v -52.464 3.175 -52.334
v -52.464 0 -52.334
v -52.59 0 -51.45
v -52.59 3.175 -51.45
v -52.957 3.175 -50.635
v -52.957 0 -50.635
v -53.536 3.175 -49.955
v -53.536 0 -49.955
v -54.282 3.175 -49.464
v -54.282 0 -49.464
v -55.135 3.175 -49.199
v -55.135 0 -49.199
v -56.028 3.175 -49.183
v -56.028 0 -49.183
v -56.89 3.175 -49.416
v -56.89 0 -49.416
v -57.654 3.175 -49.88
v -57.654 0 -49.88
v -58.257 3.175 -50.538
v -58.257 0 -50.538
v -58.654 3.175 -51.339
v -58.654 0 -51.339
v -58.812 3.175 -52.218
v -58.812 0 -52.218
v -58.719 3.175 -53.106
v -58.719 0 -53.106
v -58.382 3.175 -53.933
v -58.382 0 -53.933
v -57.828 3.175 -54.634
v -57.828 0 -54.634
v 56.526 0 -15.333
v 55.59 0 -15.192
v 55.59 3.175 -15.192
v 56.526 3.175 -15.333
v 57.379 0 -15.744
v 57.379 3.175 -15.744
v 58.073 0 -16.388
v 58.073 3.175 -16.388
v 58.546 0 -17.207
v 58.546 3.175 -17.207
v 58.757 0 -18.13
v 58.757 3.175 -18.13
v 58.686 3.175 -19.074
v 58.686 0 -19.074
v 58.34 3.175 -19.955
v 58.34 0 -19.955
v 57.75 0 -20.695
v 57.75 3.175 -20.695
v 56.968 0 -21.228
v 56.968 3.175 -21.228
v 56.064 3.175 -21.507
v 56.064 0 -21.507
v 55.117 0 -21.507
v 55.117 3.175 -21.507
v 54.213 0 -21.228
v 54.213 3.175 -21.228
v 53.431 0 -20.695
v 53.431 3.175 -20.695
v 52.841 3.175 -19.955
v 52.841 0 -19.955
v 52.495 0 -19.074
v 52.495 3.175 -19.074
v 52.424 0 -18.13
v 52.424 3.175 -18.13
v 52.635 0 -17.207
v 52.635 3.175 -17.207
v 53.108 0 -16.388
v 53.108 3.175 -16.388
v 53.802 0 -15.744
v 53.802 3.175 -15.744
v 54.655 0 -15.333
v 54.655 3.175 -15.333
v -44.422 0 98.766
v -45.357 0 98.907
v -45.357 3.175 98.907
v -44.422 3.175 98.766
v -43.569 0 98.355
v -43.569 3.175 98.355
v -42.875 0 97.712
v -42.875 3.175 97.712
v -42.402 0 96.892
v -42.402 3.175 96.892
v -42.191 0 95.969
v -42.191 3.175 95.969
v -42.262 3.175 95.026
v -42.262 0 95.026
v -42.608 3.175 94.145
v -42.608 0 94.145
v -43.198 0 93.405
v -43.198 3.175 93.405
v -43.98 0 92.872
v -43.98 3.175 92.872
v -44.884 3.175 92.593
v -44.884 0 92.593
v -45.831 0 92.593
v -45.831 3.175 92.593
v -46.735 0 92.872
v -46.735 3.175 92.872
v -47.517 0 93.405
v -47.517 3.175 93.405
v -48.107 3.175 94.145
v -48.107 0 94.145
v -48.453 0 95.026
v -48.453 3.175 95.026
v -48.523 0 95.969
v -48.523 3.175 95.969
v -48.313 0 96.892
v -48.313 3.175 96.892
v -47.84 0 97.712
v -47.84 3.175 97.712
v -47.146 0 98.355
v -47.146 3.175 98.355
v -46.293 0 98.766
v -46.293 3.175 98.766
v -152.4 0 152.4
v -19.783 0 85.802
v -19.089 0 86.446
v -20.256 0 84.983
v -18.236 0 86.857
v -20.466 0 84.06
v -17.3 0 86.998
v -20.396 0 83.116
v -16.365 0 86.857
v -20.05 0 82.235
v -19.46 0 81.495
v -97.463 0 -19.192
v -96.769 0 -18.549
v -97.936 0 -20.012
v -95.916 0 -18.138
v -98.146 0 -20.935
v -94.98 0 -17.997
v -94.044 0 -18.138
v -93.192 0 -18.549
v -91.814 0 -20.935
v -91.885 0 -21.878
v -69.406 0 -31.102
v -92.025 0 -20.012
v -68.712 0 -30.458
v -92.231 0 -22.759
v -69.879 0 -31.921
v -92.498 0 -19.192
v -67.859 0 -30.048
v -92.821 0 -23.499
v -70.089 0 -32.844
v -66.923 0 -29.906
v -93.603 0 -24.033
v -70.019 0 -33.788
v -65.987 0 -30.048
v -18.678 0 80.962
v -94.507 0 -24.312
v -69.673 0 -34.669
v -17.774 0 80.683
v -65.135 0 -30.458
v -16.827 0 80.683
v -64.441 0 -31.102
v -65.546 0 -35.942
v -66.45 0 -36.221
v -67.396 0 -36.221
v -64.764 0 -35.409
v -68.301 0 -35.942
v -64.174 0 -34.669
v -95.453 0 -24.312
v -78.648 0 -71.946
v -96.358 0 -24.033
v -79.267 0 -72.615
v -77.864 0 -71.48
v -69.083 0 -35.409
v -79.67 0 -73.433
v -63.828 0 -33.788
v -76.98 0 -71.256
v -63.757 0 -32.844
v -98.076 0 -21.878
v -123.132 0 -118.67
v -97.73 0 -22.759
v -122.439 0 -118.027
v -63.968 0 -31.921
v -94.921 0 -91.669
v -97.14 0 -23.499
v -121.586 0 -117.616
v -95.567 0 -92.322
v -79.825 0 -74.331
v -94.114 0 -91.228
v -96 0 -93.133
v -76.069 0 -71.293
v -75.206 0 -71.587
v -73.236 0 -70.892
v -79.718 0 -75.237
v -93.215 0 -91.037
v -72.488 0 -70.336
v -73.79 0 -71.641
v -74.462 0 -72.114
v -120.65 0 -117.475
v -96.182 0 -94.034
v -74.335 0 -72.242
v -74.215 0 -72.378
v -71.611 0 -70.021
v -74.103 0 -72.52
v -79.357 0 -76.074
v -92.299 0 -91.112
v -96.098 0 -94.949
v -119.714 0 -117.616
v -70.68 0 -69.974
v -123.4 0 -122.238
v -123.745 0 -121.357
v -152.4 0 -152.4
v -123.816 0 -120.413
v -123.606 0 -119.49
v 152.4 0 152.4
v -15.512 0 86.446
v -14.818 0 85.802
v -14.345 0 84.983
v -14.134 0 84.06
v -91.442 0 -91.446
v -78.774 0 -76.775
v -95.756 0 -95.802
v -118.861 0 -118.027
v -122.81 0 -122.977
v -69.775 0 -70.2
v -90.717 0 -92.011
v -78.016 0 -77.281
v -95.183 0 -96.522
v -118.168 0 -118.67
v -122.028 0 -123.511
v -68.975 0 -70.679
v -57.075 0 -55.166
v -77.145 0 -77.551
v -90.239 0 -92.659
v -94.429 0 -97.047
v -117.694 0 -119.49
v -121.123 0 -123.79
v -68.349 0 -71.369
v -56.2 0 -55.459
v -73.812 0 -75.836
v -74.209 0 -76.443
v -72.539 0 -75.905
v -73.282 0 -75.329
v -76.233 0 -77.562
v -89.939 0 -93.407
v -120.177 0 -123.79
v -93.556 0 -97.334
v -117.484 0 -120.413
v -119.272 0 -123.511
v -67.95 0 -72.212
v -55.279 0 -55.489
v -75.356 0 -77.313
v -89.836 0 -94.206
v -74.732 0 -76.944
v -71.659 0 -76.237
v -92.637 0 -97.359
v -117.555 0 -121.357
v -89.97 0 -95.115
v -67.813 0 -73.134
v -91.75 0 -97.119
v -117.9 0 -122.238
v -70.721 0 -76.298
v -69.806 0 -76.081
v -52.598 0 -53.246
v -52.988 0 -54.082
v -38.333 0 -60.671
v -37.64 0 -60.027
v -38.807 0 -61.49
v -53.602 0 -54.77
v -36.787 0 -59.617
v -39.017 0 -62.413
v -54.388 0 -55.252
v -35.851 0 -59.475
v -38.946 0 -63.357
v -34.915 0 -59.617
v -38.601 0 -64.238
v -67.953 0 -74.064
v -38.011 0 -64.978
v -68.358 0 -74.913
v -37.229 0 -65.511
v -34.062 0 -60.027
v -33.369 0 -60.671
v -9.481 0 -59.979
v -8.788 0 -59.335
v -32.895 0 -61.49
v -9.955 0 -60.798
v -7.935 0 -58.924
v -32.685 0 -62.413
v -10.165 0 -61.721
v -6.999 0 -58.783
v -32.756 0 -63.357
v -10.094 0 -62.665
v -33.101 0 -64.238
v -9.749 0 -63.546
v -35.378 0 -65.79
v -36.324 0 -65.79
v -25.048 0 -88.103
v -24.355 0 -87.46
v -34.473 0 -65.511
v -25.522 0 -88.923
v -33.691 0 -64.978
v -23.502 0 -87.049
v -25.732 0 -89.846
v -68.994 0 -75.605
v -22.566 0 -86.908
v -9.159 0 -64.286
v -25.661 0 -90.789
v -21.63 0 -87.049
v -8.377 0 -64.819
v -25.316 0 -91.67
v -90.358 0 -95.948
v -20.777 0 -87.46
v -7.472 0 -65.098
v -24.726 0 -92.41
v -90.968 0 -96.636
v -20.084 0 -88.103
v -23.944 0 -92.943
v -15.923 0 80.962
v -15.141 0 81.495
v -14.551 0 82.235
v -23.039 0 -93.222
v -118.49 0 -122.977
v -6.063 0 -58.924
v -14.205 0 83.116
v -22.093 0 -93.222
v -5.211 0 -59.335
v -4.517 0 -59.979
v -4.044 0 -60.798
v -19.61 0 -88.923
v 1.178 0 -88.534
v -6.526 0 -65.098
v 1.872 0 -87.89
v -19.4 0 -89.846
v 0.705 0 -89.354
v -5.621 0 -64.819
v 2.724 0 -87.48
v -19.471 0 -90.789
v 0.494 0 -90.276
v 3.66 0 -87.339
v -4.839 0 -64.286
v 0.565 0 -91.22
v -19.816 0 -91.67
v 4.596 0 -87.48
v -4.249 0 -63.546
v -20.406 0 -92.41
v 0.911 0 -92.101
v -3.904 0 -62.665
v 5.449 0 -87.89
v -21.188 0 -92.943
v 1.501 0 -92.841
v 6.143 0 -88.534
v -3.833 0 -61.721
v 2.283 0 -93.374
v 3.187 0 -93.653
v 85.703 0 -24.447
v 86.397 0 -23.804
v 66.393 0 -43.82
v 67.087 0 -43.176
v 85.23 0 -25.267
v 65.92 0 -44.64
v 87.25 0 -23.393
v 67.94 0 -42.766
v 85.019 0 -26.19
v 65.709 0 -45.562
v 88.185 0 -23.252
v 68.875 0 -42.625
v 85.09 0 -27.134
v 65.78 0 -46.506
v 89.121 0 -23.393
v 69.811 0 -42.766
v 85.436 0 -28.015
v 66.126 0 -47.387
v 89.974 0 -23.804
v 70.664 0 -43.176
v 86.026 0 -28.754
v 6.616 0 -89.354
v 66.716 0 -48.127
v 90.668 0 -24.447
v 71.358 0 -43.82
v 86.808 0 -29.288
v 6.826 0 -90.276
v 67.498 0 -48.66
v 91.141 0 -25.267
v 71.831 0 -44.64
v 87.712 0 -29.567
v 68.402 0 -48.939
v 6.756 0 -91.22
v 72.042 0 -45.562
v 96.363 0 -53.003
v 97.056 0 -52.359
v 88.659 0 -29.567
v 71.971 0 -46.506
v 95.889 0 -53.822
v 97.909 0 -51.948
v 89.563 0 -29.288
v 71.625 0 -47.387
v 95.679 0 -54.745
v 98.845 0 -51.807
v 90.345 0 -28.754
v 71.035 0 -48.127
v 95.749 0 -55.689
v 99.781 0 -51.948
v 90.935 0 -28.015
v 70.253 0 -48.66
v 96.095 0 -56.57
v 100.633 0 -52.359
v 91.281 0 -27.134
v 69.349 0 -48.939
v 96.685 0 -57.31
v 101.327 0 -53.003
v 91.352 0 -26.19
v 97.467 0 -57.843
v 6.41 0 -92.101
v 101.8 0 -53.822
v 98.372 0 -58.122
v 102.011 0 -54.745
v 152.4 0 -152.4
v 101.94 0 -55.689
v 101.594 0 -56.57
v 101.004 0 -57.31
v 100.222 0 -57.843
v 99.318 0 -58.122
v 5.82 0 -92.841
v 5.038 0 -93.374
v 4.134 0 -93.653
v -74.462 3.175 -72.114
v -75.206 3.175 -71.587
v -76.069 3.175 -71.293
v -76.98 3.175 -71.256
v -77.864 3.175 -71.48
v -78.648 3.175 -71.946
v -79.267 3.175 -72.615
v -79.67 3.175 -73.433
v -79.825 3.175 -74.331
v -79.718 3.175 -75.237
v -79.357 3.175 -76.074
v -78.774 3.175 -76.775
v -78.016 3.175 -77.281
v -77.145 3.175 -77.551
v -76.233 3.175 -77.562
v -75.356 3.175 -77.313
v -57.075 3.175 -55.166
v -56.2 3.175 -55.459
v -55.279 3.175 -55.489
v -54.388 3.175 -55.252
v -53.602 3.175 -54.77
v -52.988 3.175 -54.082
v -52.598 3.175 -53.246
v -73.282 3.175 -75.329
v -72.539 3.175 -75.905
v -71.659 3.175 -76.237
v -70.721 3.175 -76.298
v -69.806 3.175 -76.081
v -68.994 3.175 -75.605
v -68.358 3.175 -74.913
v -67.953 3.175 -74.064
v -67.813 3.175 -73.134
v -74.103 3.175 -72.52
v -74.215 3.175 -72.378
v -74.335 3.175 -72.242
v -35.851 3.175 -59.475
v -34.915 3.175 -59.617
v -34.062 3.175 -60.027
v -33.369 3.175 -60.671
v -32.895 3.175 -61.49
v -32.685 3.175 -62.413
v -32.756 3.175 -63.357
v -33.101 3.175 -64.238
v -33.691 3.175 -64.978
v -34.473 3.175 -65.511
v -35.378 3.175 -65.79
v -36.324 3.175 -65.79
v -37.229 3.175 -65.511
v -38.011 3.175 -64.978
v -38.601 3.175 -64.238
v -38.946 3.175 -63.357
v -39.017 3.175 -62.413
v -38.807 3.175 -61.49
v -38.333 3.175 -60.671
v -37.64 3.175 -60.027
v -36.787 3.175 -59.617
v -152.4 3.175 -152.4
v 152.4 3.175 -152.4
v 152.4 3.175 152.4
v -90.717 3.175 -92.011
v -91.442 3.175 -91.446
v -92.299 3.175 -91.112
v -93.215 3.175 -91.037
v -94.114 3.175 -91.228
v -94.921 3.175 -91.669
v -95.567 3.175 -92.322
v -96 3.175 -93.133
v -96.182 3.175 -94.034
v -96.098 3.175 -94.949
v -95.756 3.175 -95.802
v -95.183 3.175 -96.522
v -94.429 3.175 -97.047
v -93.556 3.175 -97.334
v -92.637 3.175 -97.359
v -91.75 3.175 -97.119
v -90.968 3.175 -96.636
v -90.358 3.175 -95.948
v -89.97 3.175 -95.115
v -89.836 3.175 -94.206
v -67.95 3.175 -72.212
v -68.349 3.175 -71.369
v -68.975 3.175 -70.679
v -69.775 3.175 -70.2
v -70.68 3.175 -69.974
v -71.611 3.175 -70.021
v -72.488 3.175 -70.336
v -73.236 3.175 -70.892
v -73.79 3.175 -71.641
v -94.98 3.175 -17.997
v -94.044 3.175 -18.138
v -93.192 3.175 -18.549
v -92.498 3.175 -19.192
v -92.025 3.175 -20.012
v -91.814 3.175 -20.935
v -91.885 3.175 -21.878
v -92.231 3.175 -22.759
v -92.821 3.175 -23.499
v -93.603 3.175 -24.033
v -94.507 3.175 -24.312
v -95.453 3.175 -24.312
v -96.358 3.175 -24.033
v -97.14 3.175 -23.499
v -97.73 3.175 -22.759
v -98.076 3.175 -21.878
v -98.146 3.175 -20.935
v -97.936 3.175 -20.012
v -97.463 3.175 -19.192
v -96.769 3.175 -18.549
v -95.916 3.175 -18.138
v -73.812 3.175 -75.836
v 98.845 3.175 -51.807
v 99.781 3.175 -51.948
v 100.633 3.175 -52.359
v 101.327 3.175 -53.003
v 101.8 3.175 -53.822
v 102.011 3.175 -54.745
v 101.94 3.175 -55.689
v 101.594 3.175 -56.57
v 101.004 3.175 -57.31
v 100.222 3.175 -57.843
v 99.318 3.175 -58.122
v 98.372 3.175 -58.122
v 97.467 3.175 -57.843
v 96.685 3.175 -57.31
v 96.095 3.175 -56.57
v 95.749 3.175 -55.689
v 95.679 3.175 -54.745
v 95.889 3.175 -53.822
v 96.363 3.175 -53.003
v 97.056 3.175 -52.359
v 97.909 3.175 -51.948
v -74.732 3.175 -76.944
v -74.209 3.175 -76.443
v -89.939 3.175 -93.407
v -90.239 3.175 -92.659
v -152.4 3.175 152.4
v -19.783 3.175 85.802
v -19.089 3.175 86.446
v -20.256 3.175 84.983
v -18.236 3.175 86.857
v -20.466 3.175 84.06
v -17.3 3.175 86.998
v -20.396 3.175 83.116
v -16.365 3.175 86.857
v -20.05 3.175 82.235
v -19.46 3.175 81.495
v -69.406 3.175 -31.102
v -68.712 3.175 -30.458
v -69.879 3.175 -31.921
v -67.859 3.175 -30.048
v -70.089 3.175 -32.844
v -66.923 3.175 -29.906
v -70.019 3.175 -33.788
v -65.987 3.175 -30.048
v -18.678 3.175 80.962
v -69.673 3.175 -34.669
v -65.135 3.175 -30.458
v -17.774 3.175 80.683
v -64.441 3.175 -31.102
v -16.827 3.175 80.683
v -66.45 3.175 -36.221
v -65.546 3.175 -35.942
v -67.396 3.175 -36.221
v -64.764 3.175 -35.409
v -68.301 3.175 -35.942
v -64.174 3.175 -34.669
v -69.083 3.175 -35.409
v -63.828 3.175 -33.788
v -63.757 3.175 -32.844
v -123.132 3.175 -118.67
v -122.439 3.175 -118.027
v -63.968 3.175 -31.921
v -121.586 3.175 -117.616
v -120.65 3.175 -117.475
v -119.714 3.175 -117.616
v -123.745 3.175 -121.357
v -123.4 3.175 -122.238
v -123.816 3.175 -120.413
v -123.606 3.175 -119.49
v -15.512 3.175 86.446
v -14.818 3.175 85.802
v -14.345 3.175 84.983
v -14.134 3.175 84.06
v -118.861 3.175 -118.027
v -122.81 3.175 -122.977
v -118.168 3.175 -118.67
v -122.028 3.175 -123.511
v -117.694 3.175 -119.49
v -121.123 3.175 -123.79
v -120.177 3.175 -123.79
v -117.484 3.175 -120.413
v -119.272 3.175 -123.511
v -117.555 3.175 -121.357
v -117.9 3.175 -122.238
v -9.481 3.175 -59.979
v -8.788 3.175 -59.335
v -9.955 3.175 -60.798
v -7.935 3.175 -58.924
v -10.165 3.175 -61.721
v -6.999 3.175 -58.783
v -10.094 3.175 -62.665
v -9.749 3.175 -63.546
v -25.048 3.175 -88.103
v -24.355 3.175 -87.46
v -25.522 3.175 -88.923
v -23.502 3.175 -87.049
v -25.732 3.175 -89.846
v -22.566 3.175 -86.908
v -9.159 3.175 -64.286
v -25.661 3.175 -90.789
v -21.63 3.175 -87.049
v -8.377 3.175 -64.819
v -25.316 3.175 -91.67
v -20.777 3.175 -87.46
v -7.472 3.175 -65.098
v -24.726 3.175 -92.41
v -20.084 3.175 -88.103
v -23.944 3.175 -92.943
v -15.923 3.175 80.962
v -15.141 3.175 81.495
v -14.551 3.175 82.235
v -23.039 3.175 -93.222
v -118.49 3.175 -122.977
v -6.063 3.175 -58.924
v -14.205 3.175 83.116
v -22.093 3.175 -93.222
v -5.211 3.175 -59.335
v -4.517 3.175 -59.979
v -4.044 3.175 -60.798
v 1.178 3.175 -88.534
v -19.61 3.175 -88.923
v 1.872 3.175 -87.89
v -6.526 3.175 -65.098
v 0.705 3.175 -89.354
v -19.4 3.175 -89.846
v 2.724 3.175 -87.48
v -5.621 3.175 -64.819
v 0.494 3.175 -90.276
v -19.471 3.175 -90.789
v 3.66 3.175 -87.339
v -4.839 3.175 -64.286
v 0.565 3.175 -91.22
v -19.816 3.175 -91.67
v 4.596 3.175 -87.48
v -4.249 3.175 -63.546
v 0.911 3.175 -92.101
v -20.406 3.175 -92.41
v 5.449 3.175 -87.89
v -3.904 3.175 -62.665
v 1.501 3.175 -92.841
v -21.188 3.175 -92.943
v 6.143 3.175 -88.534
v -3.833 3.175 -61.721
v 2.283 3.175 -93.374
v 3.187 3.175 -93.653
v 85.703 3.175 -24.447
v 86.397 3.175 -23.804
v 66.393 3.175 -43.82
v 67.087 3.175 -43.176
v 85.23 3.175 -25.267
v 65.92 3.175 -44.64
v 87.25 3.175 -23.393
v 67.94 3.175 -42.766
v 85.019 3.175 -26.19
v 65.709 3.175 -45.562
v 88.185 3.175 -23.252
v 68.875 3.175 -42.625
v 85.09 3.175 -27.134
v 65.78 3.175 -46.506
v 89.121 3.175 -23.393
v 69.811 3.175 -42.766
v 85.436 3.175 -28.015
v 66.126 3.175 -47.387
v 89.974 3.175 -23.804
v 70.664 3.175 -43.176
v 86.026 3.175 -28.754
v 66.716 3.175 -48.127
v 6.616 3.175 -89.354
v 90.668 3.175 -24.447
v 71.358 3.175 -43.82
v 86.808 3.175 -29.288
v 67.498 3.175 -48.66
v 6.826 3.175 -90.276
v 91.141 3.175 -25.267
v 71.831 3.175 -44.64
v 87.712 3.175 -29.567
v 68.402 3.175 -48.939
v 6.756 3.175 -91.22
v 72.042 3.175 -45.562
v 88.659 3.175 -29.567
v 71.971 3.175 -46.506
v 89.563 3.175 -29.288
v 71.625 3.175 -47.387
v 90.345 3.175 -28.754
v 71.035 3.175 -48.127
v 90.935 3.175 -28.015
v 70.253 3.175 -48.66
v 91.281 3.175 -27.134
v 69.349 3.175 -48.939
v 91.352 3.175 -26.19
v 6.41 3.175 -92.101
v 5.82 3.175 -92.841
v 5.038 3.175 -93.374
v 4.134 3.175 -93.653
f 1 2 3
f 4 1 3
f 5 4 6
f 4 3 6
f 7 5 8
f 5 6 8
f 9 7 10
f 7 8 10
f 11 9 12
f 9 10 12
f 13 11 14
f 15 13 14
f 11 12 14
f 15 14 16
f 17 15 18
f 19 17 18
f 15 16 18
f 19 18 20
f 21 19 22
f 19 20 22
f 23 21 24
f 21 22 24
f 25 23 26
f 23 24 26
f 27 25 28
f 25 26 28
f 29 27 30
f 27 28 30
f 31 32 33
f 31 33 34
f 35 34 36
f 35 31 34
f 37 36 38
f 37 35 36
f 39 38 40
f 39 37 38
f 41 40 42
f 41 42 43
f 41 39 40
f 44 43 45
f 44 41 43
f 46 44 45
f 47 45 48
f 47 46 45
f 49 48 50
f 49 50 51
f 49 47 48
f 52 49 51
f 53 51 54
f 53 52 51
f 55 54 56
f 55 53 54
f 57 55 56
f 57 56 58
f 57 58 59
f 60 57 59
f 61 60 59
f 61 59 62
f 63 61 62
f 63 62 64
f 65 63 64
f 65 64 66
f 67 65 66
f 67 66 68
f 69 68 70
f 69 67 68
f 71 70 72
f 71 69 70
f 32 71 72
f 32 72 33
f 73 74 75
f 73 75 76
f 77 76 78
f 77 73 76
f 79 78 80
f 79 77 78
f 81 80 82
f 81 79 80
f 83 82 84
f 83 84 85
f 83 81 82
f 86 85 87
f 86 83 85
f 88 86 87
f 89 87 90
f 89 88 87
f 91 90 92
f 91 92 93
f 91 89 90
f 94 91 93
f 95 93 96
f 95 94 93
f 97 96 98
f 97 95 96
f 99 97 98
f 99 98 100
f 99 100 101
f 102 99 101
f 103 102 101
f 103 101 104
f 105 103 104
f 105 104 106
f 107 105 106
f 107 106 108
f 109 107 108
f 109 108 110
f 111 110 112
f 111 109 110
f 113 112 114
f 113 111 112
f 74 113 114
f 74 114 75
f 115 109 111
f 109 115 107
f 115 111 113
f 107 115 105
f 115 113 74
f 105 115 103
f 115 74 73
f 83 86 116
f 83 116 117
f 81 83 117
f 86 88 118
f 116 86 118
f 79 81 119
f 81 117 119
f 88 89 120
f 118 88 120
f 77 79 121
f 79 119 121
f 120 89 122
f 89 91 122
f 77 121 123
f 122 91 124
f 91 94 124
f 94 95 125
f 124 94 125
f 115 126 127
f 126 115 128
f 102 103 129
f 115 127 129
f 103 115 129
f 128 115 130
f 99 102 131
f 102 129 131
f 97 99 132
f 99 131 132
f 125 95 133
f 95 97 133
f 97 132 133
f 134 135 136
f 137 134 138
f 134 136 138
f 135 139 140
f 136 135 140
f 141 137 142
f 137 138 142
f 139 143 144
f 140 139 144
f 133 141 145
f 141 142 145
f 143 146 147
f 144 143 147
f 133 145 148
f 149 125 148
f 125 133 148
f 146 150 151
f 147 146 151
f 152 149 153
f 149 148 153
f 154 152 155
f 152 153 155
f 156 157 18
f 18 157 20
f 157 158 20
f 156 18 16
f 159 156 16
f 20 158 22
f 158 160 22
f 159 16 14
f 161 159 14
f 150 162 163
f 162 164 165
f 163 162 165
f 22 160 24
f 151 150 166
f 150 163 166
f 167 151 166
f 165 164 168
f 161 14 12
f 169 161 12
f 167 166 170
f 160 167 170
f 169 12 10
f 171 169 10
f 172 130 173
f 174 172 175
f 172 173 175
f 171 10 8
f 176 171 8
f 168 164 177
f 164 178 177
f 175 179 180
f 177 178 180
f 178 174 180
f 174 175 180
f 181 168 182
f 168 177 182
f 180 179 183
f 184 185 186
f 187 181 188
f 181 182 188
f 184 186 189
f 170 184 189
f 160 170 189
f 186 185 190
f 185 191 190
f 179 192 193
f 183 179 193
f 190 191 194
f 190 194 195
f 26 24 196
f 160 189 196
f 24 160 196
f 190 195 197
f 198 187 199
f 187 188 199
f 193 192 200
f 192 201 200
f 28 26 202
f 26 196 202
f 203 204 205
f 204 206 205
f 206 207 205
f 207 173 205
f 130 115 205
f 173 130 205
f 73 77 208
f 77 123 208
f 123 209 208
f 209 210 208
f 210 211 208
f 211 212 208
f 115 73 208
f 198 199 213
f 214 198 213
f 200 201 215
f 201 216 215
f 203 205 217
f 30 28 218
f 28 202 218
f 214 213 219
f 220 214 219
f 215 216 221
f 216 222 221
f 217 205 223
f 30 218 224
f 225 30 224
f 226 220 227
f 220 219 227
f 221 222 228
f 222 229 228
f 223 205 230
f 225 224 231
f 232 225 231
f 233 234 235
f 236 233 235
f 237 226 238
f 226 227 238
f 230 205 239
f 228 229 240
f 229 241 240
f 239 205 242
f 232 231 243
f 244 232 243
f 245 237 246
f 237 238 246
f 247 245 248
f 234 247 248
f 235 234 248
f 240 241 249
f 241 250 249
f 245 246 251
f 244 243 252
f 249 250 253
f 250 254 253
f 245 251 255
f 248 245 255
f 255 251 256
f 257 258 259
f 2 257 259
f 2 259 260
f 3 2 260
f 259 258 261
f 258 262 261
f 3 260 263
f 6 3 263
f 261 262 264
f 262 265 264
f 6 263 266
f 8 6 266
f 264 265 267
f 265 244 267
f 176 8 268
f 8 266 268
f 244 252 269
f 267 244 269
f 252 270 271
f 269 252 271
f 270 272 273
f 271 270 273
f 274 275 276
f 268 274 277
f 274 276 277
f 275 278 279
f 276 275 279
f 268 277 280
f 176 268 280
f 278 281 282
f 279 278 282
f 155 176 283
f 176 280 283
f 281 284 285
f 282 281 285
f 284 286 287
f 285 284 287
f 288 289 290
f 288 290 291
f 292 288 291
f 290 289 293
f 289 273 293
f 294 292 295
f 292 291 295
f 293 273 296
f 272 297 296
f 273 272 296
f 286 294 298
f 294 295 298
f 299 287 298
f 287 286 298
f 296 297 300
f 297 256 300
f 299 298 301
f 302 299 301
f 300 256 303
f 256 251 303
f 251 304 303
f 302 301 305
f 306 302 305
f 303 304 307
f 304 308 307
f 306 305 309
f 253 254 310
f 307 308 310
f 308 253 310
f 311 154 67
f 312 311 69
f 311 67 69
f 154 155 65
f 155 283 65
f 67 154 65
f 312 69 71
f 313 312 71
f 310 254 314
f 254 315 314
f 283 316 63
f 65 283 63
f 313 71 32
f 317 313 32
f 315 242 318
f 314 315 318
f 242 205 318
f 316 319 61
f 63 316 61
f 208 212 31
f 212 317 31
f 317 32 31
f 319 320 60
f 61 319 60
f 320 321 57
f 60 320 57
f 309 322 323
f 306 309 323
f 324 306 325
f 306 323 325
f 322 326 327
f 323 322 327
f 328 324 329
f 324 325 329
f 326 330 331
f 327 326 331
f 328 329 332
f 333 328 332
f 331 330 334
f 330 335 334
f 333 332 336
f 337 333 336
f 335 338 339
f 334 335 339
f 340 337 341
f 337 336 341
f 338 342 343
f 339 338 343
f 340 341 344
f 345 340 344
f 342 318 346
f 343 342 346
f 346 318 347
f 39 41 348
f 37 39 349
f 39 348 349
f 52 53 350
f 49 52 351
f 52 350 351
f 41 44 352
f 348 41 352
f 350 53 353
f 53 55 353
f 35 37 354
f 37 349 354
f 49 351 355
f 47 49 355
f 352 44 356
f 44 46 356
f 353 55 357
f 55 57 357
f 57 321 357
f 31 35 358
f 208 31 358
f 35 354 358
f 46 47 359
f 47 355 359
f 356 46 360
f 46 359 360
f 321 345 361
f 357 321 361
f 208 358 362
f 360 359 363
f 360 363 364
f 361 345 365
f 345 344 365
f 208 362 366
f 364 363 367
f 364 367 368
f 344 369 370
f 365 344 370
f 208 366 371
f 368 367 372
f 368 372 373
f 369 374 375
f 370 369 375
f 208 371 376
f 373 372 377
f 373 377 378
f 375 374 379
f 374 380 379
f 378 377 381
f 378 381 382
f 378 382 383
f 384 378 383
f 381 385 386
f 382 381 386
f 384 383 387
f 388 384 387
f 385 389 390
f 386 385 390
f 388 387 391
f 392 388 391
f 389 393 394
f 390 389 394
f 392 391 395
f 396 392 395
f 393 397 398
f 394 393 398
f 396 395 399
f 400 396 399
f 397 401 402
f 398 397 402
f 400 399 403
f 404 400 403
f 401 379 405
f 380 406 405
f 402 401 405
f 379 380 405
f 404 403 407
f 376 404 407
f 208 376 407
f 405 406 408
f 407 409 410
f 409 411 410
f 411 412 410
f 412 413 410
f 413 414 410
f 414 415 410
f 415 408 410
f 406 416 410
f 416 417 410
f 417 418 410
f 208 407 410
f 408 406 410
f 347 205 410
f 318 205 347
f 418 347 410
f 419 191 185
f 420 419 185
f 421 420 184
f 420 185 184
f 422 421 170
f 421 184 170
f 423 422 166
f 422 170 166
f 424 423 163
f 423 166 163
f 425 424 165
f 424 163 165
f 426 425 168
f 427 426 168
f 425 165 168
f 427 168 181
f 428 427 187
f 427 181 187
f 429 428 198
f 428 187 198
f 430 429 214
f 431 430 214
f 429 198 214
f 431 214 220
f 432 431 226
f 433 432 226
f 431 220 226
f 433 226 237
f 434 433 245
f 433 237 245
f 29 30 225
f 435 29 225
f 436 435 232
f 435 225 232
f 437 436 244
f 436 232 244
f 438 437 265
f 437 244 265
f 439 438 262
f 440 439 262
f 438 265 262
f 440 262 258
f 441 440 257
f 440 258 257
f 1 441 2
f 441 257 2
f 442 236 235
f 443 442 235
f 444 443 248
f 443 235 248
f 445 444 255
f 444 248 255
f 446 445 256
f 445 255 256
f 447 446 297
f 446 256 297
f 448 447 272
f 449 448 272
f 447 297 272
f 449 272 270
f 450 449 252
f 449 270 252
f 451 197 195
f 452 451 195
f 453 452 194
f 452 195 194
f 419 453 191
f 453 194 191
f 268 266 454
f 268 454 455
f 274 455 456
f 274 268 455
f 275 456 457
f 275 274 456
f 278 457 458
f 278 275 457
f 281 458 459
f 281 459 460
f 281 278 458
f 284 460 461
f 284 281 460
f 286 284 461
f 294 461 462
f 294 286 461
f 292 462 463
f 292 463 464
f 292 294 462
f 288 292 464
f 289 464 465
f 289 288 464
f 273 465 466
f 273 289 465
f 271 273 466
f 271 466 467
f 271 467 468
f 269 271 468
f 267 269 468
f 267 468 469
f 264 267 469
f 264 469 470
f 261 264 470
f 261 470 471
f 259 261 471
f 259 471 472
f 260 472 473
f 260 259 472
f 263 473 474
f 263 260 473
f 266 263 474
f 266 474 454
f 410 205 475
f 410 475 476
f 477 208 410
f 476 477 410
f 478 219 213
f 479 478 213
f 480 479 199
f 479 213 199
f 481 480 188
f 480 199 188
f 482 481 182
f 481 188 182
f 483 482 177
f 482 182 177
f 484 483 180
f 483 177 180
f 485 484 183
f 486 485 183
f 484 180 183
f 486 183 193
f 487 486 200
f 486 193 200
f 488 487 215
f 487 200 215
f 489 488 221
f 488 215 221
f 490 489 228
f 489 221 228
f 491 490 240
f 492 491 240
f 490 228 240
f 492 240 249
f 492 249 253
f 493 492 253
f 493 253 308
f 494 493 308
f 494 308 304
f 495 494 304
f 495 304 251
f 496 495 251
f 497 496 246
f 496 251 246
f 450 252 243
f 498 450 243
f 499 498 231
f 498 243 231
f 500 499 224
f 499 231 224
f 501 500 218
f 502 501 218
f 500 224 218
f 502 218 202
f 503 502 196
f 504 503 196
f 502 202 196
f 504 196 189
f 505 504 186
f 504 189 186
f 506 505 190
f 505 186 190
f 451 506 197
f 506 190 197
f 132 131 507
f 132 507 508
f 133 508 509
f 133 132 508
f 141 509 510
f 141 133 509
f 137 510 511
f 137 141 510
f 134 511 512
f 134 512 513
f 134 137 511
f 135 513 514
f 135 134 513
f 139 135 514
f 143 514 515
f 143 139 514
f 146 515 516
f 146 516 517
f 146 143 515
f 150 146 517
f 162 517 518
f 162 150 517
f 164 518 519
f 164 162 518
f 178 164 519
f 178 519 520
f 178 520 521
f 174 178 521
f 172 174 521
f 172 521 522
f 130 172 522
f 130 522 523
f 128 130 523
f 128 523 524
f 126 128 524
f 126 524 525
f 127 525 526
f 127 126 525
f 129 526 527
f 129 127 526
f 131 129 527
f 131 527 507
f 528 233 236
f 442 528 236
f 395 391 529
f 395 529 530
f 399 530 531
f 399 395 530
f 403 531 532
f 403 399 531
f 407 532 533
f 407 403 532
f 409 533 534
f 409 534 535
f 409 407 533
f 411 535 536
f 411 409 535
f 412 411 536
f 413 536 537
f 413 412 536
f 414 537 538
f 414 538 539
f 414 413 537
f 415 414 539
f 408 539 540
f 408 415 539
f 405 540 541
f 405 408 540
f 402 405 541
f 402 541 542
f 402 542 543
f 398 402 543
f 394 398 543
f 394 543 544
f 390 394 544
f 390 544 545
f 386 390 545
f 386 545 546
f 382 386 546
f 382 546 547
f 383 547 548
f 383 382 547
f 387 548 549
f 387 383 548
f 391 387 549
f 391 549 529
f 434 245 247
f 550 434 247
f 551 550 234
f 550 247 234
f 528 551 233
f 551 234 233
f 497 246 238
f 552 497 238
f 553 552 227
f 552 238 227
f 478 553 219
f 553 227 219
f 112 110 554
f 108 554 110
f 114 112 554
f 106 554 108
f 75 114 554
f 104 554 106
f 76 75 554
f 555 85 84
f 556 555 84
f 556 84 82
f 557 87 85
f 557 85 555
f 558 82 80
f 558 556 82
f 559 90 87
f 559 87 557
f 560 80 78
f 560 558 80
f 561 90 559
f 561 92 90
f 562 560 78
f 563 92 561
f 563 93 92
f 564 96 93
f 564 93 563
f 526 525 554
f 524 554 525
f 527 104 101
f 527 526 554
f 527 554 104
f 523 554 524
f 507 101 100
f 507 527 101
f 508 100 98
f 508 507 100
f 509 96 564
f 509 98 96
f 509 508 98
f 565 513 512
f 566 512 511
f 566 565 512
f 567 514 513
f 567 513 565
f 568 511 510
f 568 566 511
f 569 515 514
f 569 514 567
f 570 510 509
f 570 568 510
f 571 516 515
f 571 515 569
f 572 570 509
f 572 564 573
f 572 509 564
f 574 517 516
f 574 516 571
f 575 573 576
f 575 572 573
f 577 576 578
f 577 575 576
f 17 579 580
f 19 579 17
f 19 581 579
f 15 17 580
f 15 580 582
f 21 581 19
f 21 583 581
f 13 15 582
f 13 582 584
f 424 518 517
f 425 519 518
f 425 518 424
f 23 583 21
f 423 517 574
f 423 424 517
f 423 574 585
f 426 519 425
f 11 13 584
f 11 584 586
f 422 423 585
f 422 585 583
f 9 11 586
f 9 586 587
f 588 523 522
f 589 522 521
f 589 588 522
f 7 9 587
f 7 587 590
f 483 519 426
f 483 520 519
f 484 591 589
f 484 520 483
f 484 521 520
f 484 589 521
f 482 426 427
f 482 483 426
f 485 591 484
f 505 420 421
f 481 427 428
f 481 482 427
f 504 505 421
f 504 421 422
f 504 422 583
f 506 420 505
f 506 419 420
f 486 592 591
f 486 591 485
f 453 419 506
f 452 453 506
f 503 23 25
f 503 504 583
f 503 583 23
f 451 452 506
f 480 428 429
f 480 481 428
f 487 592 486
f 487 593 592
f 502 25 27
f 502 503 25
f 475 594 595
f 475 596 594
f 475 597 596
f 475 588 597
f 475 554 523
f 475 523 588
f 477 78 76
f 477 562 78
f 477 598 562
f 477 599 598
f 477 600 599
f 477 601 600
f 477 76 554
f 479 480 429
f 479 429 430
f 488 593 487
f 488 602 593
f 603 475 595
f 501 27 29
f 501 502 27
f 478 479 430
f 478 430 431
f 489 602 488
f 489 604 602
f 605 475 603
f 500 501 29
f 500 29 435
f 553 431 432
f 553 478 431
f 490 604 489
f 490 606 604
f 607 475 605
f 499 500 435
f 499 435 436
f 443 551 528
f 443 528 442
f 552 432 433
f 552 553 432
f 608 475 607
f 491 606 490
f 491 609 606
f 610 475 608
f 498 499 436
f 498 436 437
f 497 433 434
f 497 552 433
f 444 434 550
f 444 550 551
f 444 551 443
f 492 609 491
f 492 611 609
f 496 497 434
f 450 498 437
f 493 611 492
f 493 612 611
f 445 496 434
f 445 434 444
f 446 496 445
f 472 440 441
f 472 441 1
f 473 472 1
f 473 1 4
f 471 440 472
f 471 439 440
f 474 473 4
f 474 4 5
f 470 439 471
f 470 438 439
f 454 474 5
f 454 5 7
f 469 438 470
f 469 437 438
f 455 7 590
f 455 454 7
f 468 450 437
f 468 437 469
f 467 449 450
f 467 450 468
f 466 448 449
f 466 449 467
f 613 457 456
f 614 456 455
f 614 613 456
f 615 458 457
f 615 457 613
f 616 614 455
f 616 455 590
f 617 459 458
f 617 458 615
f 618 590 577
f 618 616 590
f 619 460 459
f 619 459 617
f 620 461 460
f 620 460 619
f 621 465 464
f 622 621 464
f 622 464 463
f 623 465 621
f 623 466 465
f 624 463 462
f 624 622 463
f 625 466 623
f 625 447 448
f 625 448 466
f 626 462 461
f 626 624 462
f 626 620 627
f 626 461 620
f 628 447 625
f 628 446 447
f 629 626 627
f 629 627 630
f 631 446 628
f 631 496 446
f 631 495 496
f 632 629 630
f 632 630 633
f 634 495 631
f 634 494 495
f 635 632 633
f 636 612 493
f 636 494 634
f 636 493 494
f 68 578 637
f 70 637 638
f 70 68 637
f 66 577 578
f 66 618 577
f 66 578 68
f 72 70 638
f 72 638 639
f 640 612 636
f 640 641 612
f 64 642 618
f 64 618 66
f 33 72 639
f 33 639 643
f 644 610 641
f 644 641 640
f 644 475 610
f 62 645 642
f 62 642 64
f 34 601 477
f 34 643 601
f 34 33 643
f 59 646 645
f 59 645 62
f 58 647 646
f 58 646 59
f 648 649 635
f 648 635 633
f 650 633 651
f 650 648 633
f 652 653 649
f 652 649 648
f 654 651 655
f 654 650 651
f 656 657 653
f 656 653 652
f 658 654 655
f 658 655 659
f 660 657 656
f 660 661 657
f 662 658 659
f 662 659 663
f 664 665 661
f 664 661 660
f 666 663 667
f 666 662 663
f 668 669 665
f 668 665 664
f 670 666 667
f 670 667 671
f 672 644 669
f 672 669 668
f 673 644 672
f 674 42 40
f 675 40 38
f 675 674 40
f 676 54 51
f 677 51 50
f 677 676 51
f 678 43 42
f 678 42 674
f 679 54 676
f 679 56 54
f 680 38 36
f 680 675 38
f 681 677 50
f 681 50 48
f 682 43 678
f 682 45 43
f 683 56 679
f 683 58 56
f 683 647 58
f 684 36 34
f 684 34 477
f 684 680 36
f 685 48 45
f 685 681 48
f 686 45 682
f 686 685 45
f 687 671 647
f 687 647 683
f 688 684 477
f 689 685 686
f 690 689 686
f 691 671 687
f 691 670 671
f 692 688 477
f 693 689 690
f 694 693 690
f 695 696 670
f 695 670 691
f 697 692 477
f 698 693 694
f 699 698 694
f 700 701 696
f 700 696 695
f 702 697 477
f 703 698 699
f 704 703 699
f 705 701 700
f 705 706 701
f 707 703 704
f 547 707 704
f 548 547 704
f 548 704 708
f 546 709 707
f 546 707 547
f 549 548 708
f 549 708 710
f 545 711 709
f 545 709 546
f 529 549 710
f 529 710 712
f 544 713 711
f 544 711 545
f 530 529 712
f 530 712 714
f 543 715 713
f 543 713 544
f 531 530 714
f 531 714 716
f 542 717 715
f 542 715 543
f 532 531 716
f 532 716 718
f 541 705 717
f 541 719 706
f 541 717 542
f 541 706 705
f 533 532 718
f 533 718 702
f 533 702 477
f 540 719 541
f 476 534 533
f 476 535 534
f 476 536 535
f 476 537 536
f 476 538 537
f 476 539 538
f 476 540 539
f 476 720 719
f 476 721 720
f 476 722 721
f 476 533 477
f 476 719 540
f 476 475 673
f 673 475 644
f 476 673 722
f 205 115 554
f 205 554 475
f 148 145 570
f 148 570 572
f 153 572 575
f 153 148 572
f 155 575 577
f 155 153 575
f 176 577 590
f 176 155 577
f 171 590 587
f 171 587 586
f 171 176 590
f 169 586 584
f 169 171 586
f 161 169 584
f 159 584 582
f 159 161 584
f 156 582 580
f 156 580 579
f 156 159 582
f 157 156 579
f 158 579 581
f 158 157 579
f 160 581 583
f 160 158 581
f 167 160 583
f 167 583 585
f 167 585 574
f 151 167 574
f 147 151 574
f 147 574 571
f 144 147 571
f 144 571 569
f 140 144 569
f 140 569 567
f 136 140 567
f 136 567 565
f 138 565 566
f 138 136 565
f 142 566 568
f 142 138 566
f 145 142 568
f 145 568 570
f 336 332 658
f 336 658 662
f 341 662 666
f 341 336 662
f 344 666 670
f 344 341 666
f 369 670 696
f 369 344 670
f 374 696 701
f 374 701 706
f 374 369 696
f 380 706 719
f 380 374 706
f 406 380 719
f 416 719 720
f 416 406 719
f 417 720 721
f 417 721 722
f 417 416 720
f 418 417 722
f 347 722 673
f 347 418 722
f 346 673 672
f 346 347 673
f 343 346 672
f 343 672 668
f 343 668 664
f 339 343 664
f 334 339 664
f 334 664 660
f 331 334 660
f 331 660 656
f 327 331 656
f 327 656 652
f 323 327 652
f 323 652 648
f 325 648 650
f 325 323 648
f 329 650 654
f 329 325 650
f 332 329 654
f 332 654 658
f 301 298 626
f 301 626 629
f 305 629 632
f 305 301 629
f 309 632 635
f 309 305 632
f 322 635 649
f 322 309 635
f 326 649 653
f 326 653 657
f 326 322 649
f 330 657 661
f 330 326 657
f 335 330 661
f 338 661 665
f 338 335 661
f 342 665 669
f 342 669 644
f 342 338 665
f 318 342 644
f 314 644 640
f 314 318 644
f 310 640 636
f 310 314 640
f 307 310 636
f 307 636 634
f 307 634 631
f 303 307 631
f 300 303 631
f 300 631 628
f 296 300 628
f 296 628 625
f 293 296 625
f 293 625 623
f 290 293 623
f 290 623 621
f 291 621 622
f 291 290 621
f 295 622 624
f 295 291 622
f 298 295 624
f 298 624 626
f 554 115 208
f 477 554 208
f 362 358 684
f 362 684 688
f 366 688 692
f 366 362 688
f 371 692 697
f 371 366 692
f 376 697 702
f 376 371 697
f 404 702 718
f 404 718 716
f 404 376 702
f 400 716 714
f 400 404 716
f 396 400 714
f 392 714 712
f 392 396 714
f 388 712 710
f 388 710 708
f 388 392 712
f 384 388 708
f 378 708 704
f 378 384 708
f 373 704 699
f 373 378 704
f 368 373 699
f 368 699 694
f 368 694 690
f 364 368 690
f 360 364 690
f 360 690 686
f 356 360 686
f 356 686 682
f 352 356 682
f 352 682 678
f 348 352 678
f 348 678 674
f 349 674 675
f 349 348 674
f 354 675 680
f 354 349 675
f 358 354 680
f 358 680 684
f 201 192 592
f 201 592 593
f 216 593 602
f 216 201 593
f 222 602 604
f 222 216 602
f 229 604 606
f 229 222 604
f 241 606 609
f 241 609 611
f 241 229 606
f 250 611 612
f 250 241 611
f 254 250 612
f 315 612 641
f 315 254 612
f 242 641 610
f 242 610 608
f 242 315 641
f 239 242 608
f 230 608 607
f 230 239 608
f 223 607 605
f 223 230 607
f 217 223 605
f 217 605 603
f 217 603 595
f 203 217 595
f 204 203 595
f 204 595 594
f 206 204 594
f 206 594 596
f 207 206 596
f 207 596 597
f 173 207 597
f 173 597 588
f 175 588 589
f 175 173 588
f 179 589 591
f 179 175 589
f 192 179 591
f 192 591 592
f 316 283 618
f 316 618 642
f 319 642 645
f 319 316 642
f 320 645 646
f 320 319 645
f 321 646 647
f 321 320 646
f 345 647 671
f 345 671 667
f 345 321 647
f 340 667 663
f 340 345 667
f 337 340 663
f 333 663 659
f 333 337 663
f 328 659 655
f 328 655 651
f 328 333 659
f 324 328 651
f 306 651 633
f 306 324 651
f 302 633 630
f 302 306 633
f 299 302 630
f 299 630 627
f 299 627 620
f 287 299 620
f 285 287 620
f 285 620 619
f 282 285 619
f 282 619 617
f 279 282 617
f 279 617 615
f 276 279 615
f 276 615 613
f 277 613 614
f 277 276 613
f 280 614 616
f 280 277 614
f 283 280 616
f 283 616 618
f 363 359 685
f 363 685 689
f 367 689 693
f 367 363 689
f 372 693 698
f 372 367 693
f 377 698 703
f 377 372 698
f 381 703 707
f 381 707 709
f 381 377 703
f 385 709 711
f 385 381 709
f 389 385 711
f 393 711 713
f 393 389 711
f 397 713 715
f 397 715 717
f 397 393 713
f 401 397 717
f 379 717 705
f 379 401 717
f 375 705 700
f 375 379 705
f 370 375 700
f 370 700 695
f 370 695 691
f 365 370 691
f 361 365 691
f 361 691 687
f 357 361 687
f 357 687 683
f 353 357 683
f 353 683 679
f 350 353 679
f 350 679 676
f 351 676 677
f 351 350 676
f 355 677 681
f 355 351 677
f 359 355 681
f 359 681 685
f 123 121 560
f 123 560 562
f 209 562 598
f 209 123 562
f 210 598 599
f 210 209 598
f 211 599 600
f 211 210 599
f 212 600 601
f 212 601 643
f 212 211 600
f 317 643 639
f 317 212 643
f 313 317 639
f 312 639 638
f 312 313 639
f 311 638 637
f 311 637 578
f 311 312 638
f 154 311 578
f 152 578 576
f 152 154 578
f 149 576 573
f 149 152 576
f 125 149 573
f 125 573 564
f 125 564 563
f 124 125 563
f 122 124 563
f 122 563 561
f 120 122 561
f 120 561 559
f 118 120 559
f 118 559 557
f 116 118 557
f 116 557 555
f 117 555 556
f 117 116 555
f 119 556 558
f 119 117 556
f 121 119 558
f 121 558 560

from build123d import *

# Parameters (mm, degrees)
SKETCH1_W           = 304.8
SKETCH1_H           = 304.8
SKETCH1_R           = 3.175
BOSS_EXTRUDE1_DEPTH = 3.175


with BuildPart() as part:
    # Sketch1 → Boss-Extrude1 (new body)
    with BuildSketch(Plane(origin=(0, 0, 0), x_dir=(1, 0, 0), z_dir=(0, 1, 0))):
        Rectangle(SKETCH1_W, SKETCH1_H)
        with Locations(Location((-45.357357994, -95.732151897, 0), (0, 0, 270))):
            Circle(SKETCH1_R, mode=Mode.SUBTRACT)
        with Locations(Location((-17.300370061, -83.822667101, 0), (0, 0, 270))):
            Circle(SKETCH1_R, mode=Mode.SUBTRACT)
        with Locations(Location((-94.980211312, 21.171964491, 0), (0, 0, 270))):
            Circle(SKETCH1_R, mode=Mode.SUBTRACT)
        with Locations(Location((-66.923223379, 33.081449287, 0), (0, 0, 270))):
            Circle(SKETCH1_R, mode=Mode.SUBTRACT)
        with BuildLine():
            ThreePointArc((-52.46406636, 52.33405969), (-56.890341235, 49.416023332), (-57.82780569, 54.634069505))
            ThreePointArc((-57.82780569, 54.634069505), (-54.387791485, 55.252096048), (-52.46406636, 52.33405969))
        make_face(mode=Mode.SUBTRACT)
        with BuildLine():
            ThreePointArc((-74.462224597, 72.114144094), (-79.780075115, 73.876298752), (-75.355842336, 77.31299593))
            ThreePointArc((-75.355842336, 77.31299593), (-74.456010488, 76.708234204), (-73.812117445, 75.835975154))
            Line((-73.812117445, 75.835975154), (-73.282380635, 75.32912819))
            ThreePointArc((-73.282380635, 75.32912819), (-69.805735318, 76.080726121), (-67.81330034, 73.134174752))
            ThreePointArc((-67.81330034, 73.134174752), (-70.679501662, 69.974227224), (-74.103233175, 72.519505386))
            ThreePointArc((-74.103233175, 72.519505386), (-74.274071701, 72.309157863), (-74.462224597, 72.114144094))
        make_face(mode=Mode.SUBTRACT)
        with Locations(Location((-35.851005438, 62.650447232, 0), (0, 0, 270))):
            Circle(SKETCH1_R, mode=Mode.SUBTRACT)
        with Locations(Location((-6.999045964, 61.958277868, 0), (0, 0, 270))):
            Circle(SKETCH1_R, mode=Mode.SUBTRACT)
        with BuildLine():
            ThreePointArc((-89.836471178, 94.205727762), (-90.064919809, 93.02316274), (-90.717390882, 92.010774323))
            ThreePointArc((-90.717390882, 92.010774323), (-95.958022547, 95.388292783), (-89.836471178, 94.205727762))
        make_face(mode=Mode.SUBTRACT)
        with Locations(Location((-120.65, 120.65, 0), (0, 0, 270))):
            Circle(SKETCH1_R, mode=Mode.SUBTRACT)
        with Locations(Location((-22.566006832, 90.082895392, 0), (0, 0, 270))):
            Circle(SKETCH1_R, mode=Mode.SUBTRACT)
        with Locations(Location((55.590488427, 18.367118544, 0), (0, 0, 270))):
            Circle(SKETCH1_R, mode=Mode.SUBTRACT)
        with Locations(Location((68.875487034, 45.799566703, 0), (0, 0, 270))):
            Circle(SKETCH1_R, mode=Mode.SUBTRACT)
        with Locations(Location((88.185465622, 26.427041553, 0), (0, 0, 270))):
            Circle(SKETCH1_R, mode=Mode.SUBTRACT)
        with Locations(Location((98.844836516, 54.982395029, 0), (0, 0, 270))):
            Circle(SKETCH1_R, mode=Mode.SUBTRACT)
        with Locations(Location((3.66032493, 90.513631344, 0), (0, 0, 270))):
            Circle(SKETCH1_R, mode=Mode.SUBTRACT)
    extrude(amount=BOSS_EXTRUDE1_DEPTH)


solid = part.part
